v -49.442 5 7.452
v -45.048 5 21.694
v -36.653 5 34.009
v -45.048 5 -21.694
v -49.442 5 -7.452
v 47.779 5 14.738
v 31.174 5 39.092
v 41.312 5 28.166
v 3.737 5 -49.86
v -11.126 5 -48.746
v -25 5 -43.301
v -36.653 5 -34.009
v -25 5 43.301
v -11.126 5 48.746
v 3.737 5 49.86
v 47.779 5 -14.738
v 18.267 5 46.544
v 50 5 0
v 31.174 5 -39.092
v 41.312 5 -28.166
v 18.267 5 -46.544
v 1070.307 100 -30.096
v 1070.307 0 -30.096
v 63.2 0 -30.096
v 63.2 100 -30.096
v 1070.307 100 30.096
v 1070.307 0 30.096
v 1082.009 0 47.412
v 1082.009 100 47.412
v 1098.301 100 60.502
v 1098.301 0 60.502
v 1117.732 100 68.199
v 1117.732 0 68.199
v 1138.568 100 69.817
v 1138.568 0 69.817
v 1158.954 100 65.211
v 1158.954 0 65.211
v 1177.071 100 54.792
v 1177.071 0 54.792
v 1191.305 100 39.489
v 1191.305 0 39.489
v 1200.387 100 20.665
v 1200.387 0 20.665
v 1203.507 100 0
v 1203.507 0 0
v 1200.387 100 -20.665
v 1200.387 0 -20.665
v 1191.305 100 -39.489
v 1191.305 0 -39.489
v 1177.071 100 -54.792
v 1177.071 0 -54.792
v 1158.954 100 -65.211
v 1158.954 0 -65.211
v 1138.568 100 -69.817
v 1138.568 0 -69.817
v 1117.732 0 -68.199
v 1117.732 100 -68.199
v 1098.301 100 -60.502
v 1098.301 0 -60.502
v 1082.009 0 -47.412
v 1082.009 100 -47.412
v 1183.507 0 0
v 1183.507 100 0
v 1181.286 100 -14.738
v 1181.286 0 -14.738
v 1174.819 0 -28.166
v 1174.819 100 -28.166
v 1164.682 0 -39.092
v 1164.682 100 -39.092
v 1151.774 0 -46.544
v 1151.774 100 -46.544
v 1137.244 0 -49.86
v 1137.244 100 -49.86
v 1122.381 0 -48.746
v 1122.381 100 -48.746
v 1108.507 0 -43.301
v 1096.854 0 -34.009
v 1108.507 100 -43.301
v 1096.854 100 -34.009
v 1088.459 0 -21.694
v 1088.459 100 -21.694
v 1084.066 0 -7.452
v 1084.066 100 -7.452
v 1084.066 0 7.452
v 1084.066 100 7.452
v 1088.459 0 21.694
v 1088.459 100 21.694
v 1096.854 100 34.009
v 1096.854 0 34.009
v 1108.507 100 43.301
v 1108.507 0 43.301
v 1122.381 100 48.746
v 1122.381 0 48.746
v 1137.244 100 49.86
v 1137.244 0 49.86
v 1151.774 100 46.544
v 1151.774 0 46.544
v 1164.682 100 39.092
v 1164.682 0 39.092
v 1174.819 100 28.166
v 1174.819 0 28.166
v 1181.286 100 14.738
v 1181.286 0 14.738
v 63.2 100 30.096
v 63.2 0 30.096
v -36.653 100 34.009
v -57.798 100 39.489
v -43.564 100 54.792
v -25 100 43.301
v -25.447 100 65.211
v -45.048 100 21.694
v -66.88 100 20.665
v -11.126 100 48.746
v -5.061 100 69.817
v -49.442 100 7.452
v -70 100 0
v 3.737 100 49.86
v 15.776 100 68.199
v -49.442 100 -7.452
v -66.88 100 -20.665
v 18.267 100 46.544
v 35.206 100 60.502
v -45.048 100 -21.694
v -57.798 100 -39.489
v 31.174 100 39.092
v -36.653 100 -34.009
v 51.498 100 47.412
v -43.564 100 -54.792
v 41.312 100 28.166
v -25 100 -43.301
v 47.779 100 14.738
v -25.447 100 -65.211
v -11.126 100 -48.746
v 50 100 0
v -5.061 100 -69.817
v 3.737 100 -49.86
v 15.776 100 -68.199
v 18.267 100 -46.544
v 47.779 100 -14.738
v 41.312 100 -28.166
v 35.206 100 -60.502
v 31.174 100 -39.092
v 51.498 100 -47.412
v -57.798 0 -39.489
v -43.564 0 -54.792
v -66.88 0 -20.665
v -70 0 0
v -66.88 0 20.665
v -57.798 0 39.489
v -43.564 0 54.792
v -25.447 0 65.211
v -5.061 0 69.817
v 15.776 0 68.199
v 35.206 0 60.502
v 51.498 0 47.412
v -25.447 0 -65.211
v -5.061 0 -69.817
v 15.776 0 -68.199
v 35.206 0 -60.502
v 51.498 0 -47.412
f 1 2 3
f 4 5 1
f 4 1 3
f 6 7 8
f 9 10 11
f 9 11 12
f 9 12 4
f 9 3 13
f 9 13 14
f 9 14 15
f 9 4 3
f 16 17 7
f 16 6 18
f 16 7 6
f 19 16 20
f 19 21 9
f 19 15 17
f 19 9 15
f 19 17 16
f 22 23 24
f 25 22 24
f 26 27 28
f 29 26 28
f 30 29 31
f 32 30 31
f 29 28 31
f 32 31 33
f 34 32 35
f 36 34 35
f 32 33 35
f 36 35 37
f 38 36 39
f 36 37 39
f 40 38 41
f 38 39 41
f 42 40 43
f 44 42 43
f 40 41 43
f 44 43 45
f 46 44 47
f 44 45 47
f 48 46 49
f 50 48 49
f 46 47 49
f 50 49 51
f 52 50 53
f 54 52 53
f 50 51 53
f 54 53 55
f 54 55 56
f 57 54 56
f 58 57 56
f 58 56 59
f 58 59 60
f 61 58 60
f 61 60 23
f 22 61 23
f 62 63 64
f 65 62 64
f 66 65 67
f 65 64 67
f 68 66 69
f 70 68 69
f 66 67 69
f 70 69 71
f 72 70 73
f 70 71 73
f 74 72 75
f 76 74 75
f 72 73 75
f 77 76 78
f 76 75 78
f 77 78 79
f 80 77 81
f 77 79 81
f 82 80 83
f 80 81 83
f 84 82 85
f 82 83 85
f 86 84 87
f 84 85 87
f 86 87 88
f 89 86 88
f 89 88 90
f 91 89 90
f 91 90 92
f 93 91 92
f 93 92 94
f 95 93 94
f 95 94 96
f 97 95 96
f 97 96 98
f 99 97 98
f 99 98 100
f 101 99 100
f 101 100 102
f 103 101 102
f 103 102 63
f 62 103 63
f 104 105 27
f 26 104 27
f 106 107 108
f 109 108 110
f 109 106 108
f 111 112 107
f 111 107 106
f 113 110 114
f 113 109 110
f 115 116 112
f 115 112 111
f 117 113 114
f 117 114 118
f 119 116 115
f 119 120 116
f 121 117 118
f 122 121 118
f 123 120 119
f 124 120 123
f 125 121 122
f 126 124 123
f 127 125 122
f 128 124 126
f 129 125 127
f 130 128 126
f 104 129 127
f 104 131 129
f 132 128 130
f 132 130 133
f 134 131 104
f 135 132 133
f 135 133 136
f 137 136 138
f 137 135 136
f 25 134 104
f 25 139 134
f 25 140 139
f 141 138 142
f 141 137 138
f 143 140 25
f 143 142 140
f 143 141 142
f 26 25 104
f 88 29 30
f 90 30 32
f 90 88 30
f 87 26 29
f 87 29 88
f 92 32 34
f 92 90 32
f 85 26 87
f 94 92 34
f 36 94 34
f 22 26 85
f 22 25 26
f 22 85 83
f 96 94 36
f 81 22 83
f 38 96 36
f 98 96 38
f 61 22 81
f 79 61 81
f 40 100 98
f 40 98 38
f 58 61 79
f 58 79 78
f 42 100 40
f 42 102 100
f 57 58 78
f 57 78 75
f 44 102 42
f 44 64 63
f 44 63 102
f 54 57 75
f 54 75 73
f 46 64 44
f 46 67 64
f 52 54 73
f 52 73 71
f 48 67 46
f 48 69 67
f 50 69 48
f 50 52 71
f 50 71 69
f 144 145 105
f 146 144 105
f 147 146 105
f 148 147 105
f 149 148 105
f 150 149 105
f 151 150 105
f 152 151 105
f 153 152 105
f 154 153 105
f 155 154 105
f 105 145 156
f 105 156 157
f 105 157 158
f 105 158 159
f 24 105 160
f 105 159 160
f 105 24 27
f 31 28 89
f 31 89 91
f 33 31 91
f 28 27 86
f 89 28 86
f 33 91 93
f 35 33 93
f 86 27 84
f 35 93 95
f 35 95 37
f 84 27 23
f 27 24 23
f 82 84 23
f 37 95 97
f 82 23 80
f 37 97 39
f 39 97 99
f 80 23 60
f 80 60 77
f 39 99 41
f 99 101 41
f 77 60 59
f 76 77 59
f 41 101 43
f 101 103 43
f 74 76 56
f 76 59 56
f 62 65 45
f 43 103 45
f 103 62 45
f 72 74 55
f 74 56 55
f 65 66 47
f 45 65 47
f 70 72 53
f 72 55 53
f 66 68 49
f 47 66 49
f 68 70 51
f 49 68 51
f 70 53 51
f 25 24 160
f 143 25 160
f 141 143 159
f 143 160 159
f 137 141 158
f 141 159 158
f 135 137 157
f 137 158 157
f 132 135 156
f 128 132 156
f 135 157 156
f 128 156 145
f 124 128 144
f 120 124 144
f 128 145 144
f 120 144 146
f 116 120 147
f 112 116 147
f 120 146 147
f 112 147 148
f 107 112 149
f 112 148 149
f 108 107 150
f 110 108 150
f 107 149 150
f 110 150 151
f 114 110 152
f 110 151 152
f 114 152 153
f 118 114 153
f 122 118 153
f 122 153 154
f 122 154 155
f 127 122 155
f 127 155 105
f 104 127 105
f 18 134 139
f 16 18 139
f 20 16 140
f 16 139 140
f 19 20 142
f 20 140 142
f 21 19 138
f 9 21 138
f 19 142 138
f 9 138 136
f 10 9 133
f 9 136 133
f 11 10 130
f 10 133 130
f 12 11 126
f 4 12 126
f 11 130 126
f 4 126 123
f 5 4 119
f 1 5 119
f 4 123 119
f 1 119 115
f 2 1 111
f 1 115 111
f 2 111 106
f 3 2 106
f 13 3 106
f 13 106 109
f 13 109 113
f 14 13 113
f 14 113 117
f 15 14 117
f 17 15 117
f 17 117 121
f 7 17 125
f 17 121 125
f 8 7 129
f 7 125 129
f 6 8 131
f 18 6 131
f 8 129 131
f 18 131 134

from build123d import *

# Parameters (mm, degrees)
ESQUISSE1_R             = 70
BOSS_EXTRU_2_DEPTH      = 100
ESQUISSE2_R             = 50
ENL_V_MAT_EXTRU_2_DEPTH = 95
ESQUISSE4_R             = 50
ENL_V_MAT_EXTRU_3_DEPTH = 101


with BuildPart() as part:
    # Esquisse1 → Boss.-Extru.2 (new body)
    with BuildSketch(Plane(origin=(0, 0, 0), x_dir=(1, 0, 0), z_dir=(0, 1, 0))):
        with BuildLine():
            Line((1070.306926615, 30.095541494), (63.200145428, 30.095541494))
            ThreePointArc((63.200145428, 30.095541494), (68.278877334, 15.427083652), (70, 0))
            ThreePointArc((70, 0), (68.278877334, -15.427083652), (63.200145428, -30.095541494))
            Line((63.200145428, -30.095541494), (1070.306926615, -30.095541494))
            ThreePointArc((1070.306926615, -30.095541494), (1063.507072043, 0), (1070.306926615, 30.095541494))
        make_face()
        Circle(ESQUISSE1_R)
        with Locations((1133.507072043, 0)):
            Circle(ESQUISSE1_R)
    extrude(amount=BOSS_EXTRU_2_DEPTH)

    # Esquisse2 → Enlèv. mat.-Extru.2 (cut)
    with BuildSketch(Plane(origin=(0, 100, 0), x_dir=(1, 0, 0), z_dir=(0, 1, 0))):
        Circle(ESQUISSE2_R)
    extrude(amount=-ENL_V_MAT_EXTRU_2_DEPTH, mode=Mode.SUBTRACT)

    # Esquisse4 → Enlèv. mat.-Extru.3 (cut, through all)
    with BuildSketch(Plane(origin=(0, 100, 0), x_dir=(1, 0, 0), z_dir=(0, 1, 0))):
        with Locations((1133.507072043, 0)):
            Circle(ESQUISSE4_R)
    extrude(amount=-ENL_V_MAT_EXTRU_3_DEPTH, mode=Mode.SUBTRACT)


solid = part.part
